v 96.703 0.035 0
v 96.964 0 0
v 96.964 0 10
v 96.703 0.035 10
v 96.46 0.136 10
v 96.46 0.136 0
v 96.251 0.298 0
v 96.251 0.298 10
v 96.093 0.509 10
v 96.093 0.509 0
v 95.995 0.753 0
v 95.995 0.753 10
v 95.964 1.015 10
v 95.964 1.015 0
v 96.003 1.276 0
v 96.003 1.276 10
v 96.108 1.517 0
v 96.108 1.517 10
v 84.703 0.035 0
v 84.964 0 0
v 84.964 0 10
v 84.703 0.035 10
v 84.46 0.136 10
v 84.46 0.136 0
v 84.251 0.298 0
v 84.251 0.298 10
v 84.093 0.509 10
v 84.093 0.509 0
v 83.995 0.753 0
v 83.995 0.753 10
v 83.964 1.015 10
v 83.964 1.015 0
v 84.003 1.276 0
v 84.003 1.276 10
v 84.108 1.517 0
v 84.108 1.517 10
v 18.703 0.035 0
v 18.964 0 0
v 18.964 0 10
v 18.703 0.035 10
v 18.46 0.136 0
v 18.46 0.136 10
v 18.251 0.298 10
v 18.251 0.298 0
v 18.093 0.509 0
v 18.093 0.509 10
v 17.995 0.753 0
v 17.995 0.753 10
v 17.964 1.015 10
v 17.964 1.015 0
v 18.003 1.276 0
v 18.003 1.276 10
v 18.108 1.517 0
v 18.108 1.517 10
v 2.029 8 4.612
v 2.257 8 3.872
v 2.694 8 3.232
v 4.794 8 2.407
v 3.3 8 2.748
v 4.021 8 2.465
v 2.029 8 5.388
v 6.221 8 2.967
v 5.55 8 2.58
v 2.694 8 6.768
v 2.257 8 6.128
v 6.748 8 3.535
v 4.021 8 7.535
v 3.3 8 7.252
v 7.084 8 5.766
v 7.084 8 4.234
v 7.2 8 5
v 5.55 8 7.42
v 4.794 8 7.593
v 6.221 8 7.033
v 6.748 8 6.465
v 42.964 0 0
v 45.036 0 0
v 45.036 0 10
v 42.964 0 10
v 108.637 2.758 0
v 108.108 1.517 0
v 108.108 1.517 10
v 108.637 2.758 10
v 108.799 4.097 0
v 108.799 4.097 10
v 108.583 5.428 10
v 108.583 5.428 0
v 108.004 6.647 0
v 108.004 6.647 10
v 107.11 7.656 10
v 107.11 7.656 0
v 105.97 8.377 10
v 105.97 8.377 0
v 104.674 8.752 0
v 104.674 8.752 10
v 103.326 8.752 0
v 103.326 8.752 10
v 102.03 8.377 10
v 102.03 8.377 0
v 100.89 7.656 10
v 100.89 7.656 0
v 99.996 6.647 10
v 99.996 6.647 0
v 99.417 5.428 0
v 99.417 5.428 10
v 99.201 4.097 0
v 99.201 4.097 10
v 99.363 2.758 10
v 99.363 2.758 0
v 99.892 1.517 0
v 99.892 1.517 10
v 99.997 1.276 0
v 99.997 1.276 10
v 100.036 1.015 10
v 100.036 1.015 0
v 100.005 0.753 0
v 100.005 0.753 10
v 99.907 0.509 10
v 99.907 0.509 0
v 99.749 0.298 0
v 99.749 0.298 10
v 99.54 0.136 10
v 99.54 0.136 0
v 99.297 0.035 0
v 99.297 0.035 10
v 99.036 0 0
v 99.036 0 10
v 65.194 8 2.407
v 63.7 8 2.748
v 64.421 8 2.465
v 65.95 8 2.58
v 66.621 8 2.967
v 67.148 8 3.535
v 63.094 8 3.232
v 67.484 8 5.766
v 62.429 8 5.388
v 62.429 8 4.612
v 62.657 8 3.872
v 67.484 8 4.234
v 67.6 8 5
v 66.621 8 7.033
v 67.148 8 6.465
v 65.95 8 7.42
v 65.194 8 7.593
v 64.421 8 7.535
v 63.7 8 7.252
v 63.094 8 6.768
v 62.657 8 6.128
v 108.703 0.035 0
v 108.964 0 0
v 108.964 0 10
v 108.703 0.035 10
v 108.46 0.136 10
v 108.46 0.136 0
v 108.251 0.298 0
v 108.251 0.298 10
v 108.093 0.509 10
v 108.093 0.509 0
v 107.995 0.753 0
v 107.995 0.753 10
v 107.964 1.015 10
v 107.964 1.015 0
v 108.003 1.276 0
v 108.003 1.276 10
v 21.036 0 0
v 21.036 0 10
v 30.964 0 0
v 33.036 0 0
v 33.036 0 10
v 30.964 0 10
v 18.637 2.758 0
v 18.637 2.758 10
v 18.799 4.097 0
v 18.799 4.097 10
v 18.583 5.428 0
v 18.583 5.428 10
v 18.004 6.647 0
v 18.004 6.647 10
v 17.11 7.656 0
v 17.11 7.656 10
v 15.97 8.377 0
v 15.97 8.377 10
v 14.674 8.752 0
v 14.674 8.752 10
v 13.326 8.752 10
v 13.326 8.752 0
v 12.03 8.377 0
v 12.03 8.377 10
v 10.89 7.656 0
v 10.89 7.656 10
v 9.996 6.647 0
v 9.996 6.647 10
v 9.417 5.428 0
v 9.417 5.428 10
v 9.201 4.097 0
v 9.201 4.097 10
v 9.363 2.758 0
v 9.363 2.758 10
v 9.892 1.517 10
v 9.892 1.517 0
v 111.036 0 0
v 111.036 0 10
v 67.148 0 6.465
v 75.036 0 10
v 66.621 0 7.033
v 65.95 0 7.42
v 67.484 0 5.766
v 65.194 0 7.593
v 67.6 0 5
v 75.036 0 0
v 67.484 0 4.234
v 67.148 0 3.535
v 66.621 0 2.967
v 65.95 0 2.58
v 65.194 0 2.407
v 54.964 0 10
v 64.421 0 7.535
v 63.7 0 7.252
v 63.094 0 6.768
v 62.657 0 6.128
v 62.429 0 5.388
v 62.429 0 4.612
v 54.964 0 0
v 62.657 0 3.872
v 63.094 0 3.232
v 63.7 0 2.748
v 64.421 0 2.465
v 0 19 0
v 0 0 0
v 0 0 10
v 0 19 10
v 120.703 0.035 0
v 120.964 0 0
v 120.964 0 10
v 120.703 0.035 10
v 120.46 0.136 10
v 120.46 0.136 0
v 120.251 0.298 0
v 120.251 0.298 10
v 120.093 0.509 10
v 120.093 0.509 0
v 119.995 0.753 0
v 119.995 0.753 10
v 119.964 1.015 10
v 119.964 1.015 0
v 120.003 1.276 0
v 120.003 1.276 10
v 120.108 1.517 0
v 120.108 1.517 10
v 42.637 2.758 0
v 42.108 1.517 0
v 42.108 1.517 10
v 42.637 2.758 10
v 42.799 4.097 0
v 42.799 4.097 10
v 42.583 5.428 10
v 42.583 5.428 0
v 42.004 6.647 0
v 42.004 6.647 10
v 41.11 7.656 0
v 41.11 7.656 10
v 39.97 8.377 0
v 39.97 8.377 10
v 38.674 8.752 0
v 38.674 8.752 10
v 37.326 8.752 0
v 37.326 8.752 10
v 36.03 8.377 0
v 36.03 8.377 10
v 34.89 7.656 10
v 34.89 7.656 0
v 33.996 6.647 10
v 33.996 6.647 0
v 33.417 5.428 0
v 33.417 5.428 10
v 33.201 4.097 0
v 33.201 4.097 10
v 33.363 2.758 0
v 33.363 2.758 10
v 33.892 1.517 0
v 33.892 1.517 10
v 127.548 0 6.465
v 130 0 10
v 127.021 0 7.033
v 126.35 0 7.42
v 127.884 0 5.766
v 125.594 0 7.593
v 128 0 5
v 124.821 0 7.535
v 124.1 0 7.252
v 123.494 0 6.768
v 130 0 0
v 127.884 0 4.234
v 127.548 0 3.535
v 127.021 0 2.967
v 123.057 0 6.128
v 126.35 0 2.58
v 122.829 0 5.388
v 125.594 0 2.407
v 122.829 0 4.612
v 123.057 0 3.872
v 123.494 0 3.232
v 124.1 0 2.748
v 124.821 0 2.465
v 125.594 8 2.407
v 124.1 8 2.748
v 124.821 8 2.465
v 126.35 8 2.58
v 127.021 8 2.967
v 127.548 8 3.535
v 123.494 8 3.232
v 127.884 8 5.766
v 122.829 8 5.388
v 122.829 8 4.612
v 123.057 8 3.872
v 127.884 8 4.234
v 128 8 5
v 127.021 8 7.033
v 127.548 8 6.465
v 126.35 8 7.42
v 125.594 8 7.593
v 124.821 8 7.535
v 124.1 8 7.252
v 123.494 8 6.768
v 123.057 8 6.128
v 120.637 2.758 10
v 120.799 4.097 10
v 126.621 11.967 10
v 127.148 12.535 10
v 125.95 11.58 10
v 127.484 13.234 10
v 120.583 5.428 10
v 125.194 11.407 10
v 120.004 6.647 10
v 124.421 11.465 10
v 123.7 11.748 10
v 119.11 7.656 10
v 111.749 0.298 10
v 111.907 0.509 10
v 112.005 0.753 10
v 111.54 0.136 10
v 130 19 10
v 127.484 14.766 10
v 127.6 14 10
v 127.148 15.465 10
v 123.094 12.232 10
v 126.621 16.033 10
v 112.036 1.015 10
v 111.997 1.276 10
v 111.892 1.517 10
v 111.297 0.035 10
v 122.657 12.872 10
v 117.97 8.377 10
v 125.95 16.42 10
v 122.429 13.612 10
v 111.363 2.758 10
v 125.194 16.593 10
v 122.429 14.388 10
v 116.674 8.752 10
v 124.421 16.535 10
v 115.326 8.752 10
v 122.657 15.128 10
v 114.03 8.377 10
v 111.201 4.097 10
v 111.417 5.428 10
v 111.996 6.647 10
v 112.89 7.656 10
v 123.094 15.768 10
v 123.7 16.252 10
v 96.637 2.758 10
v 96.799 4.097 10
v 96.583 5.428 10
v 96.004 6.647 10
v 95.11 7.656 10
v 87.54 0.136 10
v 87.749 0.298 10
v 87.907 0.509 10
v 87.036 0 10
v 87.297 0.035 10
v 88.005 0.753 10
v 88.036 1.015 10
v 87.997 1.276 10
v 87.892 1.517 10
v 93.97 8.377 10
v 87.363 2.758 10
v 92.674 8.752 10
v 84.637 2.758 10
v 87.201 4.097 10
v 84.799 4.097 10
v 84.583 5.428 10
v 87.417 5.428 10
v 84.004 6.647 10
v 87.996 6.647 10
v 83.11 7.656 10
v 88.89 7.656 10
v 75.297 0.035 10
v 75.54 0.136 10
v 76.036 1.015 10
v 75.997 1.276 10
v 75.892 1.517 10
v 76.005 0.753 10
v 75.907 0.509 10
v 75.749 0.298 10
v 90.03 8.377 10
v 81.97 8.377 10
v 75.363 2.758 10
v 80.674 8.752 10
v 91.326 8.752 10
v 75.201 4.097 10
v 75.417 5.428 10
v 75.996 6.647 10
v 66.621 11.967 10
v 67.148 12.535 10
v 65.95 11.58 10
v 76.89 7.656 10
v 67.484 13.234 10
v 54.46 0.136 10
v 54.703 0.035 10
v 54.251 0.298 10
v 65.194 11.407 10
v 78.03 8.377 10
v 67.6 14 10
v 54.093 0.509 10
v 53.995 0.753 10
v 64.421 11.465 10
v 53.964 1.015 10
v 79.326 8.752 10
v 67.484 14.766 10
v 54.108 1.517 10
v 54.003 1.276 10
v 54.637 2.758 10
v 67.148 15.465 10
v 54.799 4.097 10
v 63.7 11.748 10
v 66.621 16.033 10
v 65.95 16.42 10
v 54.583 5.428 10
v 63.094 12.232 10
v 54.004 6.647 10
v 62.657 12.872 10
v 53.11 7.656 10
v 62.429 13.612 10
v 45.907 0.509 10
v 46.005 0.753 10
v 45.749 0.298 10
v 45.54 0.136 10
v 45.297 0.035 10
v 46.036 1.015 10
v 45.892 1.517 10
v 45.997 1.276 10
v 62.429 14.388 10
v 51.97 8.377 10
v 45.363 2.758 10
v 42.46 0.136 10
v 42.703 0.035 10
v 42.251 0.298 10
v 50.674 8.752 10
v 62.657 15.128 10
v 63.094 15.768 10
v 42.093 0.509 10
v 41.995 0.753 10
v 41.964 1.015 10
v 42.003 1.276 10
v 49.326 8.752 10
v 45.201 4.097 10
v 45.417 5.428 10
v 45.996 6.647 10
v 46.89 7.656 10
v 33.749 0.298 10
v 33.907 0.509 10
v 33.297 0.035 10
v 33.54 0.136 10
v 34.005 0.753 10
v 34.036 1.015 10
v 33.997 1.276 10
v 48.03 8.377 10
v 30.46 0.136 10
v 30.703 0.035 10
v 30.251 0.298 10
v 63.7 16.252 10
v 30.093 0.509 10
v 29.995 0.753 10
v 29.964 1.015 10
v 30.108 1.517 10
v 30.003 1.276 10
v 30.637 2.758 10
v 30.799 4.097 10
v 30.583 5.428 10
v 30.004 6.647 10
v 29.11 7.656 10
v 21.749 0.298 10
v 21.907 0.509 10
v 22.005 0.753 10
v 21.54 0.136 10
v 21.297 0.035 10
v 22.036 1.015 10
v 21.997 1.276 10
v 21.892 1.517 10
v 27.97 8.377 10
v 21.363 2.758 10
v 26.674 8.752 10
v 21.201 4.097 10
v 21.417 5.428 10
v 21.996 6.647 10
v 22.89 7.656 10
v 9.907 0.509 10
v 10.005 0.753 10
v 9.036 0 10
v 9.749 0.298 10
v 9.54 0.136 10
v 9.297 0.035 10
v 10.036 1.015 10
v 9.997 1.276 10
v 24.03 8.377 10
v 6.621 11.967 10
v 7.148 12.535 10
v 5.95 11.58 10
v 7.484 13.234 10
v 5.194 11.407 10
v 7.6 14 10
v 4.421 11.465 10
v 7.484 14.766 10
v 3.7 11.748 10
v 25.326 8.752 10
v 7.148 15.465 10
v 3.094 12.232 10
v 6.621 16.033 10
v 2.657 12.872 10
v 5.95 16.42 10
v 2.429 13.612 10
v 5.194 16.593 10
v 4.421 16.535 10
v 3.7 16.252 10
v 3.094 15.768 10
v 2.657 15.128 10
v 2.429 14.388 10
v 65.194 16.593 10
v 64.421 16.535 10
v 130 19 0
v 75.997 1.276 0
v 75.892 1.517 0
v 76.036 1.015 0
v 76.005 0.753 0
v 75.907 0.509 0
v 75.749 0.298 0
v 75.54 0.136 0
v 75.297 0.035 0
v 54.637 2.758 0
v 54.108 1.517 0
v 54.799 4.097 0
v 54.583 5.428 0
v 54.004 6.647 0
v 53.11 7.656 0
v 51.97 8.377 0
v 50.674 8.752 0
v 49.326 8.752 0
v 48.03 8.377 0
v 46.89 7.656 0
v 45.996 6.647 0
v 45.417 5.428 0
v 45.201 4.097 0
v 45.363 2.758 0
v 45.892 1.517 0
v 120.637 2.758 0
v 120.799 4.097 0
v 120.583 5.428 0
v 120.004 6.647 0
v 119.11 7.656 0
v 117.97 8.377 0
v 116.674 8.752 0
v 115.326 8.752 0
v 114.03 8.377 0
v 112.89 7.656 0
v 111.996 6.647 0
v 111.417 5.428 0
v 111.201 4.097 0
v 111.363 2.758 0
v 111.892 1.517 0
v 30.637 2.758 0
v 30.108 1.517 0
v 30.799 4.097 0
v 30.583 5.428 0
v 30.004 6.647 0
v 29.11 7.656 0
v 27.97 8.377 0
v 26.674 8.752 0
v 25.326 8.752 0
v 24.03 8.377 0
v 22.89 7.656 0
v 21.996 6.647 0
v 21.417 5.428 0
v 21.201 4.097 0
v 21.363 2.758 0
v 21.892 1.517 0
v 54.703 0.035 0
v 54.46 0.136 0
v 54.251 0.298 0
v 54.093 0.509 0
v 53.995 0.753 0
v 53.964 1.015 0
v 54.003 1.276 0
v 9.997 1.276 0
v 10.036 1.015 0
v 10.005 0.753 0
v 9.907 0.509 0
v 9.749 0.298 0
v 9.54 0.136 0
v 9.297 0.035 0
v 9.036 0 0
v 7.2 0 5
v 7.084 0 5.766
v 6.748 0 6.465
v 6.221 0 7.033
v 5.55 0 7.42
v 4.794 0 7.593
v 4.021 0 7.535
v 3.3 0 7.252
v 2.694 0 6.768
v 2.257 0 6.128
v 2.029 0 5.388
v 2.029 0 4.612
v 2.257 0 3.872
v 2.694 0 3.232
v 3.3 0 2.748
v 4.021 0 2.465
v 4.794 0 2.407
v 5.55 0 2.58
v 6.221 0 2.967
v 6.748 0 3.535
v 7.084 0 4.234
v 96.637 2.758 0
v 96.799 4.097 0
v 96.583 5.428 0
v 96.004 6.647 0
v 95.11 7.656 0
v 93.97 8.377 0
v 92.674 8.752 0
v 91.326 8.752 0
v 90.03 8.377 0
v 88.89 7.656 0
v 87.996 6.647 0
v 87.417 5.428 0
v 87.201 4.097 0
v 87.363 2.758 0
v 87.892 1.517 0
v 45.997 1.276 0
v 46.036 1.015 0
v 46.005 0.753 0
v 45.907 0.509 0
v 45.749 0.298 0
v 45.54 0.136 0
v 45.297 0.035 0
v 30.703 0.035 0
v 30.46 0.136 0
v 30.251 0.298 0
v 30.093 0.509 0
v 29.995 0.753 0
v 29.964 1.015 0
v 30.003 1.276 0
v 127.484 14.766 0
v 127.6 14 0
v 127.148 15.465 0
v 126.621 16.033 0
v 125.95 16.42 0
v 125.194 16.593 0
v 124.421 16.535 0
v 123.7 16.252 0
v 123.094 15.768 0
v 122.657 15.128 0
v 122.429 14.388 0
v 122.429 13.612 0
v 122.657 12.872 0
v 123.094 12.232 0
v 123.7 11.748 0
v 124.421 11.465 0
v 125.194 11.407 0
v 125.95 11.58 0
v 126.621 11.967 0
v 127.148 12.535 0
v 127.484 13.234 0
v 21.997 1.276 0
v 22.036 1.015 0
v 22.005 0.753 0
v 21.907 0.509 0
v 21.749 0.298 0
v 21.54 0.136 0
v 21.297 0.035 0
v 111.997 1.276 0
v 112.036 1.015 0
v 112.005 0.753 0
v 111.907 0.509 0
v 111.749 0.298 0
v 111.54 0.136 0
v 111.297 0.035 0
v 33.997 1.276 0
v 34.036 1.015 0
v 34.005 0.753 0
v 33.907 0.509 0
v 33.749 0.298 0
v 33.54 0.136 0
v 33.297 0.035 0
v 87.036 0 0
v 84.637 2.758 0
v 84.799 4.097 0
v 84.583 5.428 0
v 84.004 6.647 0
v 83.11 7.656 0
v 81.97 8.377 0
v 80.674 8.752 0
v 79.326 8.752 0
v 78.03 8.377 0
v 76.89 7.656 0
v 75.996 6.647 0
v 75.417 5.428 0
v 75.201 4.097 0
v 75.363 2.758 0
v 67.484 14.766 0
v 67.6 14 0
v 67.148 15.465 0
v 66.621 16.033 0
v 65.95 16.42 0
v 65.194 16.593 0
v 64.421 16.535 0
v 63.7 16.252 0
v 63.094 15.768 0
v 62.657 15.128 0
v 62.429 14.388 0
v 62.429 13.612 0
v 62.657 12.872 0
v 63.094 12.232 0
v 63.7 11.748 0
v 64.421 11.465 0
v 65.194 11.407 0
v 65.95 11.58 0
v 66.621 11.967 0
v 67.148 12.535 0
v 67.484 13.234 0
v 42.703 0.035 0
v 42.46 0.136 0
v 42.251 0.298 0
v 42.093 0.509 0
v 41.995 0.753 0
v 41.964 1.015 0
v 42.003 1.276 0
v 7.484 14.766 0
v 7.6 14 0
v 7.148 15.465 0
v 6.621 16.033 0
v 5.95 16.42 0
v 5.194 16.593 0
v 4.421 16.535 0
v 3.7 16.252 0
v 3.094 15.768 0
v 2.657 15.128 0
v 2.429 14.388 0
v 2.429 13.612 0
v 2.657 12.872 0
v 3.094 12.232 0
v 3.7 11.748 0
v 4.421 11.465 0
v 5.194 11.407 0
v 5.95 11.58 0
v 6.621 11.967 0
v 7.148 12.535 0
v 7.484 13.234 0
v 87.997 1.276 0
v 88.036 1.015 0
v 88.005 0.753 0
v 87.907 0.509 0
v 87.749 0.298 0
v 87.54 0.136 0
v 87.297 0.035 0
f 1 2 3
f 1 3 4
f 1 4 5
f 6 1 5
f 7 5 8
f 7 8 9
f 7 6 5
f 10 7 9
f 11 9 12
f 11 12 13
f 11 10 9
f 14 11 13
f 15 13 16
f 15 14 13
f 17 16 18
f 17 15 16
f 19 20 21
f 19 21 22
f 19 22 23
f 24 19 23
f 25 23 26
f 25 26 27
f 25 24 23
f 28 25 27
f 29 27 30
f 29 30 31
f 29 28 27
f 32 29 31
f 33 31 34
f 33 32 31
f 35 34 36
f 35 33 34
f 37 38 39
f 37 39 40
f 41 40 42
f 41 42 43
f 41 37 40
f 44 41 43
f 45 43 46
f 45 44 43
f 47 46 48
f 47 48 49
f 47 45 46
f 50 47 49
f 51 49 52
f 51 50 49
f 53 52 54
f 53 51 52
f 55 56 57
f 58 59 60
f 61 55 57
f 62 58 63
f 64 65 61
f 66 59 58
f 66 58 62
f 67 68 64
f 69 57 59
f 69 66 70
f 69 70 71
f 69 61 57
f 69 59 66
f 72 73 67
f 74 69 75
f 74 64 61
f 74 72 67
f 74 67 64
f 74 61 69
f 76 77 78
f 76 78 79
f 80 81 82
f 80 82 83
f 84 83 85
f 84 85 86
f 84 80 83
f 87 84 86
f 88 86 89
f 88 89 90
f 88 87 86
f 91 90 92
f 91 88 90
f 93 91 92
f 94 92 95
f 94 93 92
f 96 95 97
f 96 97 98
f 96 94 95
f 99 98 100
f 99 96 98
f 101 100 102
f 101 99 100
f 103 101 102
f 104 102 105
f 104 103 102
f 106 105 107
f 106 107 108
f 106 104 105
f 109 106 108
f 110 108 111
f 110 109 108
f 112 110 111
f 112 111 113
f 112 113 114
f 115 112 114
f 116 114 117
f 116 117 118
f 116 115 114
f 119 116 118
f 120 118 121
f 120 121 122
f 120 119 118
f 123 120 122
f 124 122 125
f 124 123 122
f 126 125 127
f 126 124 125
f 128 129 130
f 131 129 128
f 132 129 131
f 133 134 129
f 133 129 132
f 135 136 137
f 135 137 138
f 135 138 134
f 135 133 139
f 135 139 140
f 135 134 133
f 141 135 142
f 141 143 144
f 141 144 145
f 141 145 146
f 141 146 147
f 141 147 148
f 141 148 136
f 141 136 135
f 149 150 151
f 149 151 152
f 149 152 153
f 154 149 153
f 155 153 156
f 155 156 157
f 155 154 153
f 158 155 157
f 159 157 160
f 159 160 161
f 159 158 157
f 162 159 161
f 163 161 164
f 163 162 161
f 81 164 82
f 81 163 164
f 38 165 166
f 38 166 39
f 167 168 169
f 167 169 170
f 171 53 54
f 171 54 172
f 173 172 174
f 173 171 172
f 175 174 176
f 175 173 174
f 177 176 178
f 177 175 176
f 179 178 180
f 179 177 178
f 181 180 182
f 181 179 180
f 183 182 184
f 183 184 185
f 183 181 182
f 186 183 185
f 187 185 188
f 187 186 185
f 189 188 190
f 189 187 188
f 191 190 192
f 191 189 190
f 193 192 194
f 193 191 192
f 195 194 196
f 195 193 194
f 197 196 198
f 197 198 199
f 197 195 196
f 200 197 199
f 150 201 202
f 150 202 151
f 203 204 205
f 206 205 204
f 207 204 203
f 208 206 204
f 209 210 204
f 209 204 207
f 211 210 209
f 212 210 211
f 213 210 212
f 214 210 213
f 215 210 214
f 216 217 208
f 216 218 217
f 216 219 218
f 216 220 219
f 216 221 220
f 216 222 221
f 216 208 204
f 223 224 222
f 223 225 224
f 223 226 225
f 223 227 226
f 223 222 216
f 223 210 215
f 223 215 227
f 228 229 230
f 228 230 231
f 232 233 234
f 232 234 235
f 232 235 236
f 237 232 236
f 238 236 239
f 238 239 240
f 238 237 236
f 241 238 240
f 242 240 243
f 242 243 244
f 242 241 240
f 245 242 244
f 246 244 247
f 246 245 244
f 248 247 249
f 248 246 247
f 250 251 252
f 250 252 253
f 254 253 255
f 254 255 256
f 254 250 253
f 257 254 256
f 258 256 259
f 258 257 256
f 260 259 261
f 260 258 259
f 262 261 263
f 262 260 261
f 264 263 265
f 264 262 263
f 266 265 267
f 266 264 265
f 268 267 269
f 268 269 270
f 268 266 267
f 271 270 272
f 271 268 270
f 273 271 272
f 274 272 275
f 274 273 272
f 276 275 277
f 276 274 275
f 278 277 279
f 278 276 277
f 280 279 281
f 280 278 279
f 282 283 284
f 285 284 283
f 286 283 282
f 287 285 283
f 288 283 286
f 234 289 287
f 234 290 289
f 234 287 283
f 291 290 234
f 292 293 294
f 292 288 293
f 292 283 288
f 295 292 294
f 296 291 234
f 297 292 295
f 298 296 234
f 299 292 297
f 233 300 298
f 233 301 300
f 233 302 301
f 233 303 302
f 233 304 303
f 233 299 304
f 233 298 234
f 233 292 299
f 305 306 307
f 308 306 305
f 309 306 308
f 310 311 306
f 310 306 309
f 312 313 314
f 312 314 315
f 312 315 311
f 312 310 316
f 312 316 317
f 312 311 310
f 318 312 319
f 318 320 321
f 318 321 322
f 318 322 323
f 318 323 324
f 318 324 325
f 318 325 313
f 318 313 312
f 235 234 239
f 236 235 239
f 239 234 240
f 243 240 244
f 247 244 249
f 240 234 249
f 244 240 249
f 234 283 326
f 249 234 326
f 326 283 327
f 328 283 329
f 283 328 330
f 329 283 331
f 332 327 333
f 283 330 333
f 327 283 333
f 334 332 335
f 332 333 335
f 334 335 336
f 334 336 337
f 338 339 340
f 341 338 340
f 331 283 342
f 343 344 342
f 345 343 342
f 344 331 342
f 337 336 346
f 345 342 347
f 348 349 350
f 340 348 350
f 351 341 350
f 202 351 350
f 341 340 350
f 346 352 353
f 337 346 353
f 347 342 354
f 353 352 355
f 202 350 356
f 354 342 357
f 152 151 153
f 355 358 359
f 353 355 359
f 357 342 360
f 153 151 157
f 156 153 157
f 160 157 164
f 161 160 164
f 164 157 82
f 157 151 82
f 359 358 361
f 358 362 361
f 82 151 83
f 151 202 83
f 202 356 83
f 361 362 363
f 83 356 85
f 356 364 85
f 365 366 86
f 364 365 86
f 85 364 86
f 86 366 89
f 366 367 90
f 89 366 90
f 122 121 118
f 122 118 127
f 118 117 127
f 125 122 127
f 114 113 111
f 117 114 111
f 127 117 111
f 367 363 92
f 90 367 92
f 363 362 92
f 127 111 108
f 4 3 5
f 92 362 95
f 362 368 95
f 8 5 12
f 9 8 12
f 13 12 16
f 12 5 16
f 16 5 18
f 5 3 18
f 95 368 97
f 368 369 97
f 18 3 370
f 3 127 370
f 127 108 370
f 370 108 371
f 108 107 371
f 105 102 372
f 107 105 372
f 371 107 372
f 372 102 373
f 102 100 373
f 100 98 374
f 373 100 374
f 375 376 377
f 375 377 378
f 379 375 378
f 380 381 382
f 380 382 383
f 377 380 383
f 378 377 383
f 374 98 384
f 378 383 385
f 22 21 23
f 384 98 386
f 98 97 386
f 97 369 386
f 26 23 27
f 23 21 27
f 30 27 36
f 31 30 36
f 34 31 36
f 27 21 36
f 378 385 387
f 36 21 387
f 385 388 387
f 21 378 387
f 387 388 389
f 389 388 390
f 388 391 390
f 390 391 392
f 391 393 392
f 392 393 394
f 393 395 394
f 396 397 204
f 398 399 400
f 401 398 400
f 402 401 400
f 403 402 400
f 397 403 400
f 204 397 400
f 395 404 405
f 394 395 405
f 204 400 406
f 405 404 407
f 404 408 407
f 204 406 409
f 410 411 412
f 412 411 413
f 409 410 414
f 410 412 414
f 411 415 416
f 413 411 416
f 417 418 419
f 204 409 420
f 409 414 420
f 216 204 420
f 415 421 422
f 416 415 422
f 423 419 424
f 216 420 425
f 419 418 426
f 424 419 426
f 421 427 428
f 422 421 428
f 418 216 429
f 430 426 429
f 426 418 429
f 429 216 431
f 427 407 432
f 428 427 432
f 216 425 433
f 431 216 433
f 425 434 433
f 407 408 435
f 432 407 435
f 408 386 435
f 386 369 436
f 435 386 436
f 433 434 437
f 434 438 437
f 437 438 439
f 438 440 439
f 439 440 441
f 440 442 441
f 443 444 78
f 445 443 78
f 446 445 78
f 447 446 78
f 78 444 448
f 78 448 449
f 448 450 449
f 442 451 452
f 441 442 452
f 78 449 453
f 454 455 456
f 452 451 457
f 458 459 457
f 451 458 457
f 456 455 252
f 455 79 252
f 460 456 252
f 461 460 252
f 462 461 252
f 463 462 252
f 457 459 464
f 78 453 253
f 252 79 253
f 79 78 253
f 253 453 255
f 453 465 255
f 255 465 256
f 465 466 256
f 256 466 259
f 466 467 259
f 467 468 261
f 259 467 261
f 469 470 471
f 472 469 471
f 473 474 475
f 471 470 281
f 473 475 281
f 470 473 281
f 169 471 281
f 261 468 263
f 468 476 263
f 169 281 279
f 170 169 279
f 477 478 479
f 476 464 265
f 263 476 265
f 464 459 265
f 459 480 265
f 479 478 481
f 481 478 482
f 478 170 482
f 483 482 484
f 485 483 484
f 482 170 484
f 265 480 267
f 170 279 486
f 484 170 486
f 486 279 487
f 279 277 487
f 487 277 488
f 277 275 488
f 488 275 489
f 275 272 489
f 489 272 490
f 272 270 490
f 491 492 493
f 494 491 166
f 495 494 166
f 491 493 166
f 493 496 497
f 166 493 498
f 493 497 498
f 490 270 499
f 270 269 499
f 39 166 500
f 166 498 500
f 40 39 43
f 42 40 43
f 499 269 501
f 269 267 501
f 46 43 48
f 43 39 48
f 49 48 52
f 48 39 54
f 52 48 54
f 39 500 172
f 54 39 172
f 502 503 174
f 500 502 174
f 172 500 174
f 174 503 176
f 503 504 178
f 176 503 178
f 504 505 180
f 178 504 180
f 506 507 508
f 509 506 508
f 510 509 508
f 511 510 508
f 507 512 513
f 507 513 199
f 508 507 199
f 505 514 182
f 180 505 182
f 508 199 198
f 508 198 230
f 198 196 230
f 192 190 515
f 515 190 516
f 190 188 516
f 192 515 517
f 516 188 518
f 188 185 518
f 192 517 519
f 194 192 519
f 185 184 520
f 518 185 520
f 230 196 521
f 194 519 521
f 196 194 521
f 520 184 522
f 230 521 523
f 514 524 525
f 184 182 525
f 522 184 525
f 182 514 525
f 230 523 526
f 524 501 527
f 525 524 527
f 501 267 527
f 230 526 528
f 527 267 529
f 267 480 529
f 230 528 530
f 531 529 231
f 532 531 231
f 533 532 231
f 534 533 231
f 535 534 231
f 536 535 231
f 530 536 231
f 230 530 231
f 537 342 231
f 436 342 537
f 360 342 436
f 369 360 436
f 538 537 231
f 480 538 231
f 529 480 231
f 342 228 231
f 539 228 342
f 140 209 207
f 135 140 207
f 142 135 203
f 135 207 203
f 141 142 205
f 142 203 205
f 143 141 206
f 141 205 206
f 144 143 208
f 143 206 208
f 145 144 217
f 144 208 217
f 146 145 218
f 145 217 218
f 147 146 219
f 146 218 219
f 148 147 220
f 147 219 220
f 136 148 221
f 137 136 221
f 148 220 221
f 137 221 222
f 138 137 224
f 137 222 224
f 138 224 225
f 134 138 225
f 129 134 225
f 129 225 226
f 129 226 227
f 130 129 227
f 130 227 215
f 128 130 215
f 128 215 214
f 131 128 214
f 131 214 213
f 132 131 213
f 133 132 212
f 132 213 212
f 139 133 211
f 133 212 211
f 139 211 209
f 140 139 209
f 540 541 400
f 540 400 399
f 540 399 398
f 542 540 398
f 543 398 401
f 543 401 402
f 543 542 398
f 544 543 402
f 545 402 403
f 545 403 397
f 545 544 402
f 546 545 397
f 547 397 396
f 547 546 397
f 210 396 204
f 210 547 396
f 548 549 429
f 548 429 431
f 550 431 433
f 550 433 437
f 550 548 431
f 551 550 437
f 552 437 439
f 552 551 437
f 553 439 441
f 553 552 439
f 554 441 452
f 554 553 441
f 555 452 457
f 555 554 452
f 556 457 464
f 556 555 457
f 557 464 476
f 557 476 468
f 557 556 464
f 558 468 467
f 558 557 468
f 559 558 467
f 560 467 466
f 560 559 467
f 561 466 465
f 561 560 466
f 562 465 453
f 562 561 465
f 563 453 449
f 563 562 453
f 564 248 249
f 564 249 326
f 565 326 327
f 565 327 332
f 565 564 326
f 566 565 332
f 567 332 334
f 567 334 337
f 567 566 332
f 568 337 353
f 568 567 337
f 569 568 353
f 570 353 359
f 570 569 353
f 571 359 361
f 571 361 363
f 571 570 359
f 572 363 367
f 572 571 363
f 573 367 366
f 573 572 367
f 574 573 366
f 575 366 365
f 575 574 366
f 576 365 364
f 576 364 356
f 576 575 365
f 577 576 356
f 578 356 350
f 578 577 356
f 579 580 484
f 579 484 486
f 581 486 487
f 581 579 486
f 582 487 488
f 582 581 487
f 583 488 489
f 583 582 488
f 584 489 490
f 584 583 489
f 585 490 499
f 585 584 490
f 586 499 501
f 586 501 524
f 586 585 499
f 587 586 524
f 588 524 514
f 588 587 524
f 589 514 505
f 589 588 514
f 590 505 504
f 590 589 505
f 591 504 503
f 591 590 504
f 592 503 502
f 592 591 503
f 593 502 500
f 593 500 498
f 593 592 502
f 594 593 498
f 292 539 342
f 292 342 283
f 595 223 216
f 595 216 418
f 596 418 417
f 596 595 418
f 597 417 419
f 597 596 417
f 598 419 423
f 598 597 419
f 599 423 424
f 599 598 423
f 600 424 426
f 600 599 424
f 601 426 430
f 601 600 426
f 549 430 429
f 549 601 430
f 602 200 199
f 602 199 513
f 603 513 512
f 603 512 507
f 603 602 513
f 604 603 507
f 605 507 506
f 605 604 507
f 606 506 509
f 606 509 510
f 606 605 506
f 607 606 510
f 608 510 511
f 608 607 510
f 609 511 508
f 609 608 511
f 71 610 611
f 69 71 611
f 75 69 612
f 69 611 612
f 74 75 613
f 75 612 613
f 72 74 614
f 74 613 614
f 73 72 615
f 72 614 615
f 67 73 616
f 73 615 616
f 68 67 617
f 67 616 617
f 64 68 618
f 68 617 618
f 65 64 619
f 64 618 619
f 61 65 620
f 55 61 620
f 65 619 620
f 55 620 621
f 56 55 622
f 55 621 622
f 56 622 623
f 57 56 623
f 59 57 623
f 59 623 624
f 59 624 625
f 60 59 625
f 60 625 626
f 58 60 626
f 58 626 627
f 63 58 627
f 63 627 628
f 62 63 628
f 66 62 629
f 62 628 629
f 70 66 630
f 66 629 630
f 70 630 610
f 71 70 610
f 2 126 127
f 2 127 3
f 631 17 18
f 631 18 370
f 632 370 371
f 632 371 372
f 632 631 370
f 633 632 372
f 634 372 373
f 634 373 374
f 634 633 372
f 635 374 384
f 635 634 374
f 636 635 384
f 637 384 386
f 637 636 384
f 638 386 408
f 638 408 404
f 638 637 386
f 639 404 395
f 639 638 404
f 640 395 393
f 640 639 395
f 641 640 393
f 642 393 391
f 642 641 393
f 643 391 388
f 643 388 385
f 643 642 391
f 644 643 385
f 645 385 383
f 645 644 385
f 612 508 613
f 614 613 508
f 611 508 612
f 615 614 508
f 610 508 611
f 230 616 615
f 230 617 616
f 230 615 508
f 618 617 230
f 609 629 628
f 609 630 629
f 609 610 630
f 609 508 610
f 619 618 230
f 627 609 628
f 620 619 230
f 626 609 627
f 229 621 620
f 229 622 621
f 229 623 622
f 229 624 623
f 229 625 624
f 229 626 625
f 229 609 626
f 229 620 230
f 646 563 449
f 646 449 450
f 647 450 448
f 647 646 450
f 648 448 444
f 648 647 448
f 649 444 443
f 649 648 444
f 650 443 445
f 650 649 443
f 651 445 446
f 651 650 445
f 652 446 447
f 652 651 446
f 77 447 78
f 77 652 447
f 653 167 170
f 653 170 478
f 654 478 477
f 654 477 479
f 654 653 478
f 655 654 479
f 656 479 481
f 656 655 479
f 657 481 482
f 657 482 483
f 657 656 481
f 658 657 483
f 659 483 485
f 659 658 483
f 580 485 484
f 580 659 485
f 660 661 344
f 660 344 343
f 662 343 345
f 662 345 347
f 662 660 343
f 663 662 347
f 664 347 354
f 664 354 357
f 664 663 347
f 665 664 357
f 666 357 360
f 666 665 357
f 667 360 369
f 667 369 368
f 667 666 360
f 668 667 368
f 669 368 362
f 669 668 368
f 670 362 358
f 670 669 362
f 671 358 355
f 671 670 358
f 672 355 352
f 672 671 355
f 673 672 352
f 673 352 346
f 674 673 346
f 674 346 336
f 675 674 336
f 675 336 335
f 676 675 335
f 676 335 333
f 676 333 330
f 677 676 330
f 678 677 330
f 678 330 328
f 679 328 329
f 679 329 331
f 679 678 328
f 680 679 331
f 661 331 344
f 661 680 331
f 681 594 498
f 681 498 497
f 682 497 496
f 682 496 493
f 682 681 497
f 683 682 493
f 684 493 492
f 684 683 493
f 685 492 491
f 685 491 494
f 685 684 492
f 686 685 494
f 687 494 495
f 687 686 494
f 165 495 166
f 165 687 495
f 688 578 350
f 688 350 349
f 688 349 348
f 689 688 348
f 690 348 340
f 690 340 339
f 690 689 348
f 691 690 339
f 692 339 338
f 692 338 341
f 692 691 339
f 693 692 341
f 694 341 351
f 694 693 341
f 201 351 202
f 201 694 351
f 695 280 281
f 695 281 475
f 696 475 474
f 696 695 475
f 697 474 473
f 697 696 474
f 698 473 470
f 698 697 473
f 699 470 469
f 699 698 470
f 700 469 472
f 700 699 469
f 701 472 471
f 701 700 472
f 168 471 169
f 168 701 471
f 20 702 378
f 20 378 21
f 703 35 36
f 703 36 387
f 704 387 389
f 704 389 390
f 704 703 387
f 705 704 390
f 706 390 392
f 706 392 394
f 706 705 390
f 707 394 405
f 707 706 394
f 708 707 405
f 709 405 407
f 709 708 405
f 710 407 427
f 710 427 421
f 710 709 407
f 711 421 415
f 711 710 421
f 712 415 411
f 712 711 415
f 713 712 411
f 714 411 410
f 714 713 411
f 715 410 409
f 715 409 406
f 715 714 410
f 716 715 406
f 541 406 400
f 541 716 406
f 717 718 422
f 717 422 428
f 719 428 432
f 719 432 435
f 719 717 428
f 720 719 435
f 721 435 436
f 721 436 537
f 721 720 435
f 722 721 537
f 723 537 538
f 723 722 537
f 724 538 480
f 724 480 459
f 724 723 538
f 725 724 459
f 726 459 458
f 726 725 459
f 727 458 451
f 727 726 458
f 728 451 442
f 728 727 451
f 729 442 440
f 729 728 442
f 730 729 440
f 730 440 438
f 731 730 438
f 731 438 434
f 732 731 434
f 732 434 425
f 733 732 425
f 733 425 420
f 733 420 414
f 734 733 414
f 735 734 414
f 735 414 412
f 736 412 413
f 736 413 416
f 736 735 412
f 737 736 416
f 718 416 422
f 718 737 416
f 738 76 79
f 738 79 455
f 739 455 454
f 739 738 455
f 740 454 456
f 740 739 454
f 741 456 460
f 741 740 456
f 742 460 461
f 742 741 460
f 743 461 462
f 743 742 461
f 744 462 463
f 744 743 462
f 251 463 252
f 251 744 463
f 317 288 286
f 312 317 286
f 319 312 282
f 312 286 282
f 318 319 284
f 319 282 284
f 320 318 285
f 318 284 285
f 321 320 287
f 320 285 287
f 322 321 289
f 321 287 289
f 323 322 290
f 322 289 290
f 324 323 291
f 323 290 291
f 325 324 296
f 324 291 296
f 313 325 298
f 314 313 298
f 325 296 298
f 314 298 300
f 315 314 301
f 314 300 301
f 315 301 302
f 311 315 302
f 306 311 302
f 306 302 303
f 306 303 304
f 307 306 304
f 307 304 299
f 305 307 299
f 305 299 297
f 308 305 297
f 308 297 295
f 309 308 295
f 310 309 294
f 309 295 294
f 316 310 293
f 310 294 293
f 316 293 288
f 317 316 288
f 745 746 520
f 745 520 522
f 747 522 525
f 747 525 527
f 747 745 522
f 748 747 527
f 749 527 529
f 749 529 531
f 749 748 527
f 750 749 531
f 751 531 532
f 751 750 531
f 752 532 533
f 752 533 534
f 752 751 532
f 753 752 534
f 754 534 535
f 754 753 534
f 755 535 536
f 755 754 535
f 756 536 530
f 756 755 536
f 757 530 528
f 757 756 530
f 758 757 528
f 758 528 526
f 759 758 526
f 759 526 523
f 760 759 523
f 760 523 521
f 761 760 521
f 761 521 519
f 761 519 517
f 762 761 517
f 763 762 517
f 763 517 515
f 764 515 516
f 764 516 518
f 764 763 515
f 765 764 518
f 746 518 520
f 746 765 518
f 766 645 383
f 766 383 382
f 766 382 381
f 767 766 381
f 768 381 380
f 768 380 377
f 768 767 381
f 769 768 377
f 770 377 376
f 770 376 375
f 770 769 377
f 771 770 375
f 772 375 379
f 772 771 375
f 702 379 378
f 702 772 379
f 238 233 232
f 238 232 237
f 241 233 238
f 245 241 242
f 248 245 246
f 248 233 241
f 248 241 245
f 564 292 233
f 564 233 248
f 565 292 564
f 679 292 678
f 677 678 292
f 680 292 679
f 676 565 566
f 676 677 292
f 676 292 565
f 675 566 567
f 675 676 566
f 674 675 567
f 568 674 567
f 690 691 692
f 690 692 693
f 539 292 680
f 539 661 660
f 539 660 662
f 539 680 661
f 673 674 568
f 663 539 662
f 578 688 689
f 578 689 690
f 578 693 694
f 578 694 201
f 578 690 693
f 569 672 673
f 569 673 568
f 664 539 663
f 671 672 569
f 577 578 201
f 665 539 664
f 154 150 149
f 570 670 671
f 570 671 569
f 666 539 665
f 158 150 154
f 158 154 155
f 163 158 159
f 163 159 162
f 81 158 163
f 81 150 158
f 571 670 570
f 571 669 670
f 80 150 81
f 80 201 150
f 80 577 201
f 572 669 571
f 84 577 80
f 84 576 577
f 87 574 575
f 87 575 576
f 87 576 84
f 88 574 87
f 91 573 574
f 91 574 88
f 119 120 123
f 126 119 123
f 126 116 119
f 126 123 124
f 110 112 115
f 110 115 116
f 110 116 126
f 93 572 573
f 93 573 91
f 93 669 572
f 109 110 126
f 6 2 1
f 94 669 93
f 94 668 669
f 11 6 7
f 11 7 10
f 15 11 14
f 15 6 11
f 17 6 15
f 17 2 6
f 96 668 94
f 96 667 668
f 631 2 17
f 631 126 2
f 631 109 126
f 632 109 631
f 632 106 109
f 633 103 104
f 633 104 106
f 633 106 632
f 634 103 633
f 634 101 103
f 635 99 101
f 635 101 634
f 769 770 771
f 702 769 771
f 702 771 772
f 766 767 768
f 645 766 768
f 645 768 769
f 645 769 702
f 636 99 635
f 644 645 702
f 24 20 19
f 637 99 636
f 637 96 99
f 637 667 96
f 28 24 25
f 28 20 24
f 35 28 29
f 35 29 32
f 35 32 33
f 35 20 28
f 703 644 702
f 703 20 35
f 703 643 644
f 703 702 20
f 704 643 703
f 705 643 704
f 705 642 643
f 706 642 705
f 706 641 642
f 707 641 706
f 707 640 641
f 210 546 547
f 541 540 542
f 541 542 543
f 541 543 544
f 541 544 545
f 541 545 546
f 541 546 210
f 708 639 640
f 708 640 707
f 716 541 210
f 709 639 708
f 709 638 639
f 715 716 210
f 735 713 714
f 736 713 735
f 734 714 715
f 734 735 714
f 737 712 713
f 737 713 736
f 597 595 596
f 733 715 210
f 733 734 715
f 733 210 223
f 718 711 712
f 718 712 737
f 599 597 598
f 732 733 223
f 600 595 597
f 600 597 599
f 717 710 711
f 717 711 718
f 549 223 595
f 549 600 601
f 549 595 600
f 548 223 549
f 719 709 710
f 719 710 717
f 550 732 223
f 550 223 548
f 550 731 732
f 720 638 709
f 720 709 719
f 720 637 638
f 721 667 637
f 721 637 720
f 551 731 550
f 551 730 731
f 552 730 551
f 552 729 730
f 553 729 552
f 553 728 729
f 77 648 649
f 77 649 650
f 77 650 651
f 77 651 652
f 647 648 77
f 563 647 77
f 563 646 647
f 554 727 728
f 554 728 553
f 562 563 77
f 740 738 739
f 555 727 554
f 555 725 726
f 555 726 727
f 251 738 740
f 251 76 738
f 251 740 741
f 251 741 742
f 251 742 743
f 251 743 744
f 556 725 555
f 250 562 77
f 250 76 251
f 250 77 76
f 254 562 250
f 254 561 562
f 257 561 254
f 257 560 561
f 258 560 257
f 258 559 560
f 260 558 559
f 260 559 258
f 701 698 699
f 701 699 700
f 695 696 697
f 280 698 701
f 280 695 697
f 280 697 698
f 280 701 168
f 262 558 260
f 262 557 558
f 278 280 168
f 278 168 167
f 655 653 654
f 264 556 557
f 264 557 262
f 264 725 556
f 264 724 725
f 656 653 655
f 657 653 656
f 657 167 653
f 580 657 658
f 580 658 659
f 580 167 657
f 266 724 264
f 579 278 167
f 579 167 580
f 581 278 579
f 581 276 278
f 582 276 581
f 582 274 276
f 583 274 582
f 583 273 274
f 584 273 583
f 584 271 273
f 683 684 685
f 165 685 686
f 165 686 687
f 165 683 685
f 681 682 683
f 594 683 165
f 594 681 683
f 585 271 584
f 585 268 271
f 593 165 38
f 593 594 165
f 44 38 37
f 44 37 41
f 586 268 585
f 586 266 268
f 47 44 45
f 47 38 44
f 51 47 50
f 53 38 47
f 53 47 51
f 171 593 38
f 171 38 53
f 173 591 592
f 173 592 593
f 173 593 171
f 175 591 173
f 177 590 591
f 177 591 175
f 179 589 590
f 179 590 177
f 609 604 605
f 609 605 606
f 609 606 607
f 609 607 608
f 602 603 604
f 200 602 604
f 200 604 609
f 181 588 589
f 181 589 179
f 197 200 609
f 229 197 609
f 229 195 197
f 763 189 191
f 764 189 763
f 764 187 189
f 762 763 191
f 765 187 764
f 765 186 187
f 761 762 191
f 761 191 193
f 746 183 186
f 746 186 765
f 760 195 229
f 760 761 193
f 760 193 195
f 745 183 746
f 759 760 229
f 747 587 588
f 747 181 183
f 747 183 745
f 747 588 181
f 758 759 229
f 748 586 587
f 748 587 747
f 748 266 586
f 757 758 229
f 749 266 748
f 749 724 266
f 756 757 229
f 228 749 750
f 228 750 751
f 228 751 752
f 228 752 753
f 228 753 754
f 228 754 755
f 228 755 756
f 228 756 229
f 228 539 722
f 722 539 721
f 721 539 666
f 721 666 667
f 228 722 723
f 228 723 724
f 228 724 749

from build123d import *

# Parameters (mm, degrees)
SKETCH1_R           = 2.6
BOSS_EXTRUDE1_DEPTH = 10
SKETCH2_R           = 2.6
CUT_EXTRUDE1_DEPTH  = 8


with BuildPart() as part:
    # Sketch1 → Boss-Extrude1 (new body)
    with BuildSketch(Plane.XY):
        with BuildLine():
            Line((0, 0), (0, 19))
            Line((0, 19), (130, 19))
            Line((130, 19), (130, 0))
            Line((130, 0), (120.963869458, 0))
            ThreePointArc((120.963869458, 0), (120.092881118, 0.508696316), (120.108029897, 1.517241379))
            ThreePointArc((120.108029897, 1.517241379), (116, 8.8), (111.891970103, 1.517241379))
            ThreePointArc((111.891970103, 1.517241379), (111.907118882, 0.508696316), (111.036130542, 0))
            Line((111.036130542, 0), (108.963869458, 0))
            ThreePointArc((108.963869458, 0), (108.092881118, 0.508696316), (108.108029897, 1.517241379))
            ThreePointArc((108.108029897, 1.517241379), (104, 8.8), (99.891970103, 1.517241379))
            ThreePointArc((99.891970103, 1.517241379), (99.907118882, 0.508696316), (99.036130542, 0))
            Line((99.036130542, 0), (96.963869458, 0))
            ThreePointArc((96.963869458, 0), (96.092881118, 0.508696316), (96.108029897, 1.517241379))
            ThreePointArc((96.108029897, 1.517241379), (92, 8.8), (87.891970103, 1.517241379))
            ThreePointArc((87.891970103, 1.517241379), (87.907118882, 0.508696316), (87.036130542, 0))
            Line((87.036130542, 0), (84.963869458, 0))
            ThreePointArc((84.963869458, 0), (84.092881118, 0.508696316), (84.108029897, 1.517241379))
            ThreePointArc((84.108029897, 1.517241379), (80, 8.8), (75.891970103, 1.517241379))
            ThreePointArc((75.891970103, 1.517241379), (75.907118882, 0.508696316), (75.036130542, 0))
            Line((75.036130542, 0), (54.963869458, 0))
            ThreePointArc((54.963869458, 0), (54.092881118, 0.508696316), (54.108029897, 1.517241379))
            ThreePointArc((54.108029897, 1.517241379), (50, 8.8), (45.891970103, 1.517241379))
            ThreePointArc((45.891970103, 1.517241379), (45.907118882, 0.508696316), (45.036130542, 0))
            Line((45.036130542, 0), (42.963869458, 0))
            ThreePointArc((42.963869458, 0), (42.092881118, 0.508696316), (42.108029897, 1.517241379))
            ThreePointArc((42.108029897, 1.517241379), (38, 8.8), (33.891970103, 1.517241379))
            ThreePointArc((33.891970103, 1.517241379), (33.907118882, 0.508696316), (33.036130542, 0))
            Line((33.036130542, 0), (30.963869458, 0))
            ThreePointArc((30.963869458, 0), (30.092881118, 0.508696316), (30.108029897, 1.517241379))
            ThreePointArc((30.108029897, 1.517241379), (26, 8.8), (21.891970103, 1.517241379))
            ThreePointArc((21.891970103, 1.517241379), (21.907118882, 0.508696316), (21.036130542, 0))
            Line((21.036130542, 0), (18.963869458, 0))
            ThreePointArc((18.963869458, 0), (18.092881118, 0.508696316), (18.108029897, 1.517241379))
            ThreePointArc((18.108029897, 1.517241379), (14, 8.8), (9.891970103, 1.517241379))
            ThreePointArc((9.891970103, 1.517241379), (9.907118882, 0.508696316), (9.036130542, 0))
            Line((9.036130542, 0), (0, 0))
        make_face()
        with Locations((5, 14)):
            Circle(SKETCH1_R, mode=Mode.SUBTRACT)
        with Locations((65, 14)):
            Circle(SKETCH1_R, mode=Mode.SUBTRACT)
        with Locations((125, 14)):
            Circle(SKETCH1_R, mode=Mode.SUBTRACT)
    extrude(amount=BOSS_EXTRUDE1_DEPTH)

    # Sketch2 → Cut-Extrude1 (cut)
    with BuildSketch(Plane.XZ):
        with Locations((4.6, 5)):
            Circle(SKETCH2_R)
        with Locations((65, 5)):
            Circle(SKETCH2_R)
        with Locations((125.4, 5)):
            Circle(SKETCH2_R)
    extrude(amount=-CUT_EXTRUDE1_DEPTH, mode=Mode.SUBTRACT)


solid = part.part
